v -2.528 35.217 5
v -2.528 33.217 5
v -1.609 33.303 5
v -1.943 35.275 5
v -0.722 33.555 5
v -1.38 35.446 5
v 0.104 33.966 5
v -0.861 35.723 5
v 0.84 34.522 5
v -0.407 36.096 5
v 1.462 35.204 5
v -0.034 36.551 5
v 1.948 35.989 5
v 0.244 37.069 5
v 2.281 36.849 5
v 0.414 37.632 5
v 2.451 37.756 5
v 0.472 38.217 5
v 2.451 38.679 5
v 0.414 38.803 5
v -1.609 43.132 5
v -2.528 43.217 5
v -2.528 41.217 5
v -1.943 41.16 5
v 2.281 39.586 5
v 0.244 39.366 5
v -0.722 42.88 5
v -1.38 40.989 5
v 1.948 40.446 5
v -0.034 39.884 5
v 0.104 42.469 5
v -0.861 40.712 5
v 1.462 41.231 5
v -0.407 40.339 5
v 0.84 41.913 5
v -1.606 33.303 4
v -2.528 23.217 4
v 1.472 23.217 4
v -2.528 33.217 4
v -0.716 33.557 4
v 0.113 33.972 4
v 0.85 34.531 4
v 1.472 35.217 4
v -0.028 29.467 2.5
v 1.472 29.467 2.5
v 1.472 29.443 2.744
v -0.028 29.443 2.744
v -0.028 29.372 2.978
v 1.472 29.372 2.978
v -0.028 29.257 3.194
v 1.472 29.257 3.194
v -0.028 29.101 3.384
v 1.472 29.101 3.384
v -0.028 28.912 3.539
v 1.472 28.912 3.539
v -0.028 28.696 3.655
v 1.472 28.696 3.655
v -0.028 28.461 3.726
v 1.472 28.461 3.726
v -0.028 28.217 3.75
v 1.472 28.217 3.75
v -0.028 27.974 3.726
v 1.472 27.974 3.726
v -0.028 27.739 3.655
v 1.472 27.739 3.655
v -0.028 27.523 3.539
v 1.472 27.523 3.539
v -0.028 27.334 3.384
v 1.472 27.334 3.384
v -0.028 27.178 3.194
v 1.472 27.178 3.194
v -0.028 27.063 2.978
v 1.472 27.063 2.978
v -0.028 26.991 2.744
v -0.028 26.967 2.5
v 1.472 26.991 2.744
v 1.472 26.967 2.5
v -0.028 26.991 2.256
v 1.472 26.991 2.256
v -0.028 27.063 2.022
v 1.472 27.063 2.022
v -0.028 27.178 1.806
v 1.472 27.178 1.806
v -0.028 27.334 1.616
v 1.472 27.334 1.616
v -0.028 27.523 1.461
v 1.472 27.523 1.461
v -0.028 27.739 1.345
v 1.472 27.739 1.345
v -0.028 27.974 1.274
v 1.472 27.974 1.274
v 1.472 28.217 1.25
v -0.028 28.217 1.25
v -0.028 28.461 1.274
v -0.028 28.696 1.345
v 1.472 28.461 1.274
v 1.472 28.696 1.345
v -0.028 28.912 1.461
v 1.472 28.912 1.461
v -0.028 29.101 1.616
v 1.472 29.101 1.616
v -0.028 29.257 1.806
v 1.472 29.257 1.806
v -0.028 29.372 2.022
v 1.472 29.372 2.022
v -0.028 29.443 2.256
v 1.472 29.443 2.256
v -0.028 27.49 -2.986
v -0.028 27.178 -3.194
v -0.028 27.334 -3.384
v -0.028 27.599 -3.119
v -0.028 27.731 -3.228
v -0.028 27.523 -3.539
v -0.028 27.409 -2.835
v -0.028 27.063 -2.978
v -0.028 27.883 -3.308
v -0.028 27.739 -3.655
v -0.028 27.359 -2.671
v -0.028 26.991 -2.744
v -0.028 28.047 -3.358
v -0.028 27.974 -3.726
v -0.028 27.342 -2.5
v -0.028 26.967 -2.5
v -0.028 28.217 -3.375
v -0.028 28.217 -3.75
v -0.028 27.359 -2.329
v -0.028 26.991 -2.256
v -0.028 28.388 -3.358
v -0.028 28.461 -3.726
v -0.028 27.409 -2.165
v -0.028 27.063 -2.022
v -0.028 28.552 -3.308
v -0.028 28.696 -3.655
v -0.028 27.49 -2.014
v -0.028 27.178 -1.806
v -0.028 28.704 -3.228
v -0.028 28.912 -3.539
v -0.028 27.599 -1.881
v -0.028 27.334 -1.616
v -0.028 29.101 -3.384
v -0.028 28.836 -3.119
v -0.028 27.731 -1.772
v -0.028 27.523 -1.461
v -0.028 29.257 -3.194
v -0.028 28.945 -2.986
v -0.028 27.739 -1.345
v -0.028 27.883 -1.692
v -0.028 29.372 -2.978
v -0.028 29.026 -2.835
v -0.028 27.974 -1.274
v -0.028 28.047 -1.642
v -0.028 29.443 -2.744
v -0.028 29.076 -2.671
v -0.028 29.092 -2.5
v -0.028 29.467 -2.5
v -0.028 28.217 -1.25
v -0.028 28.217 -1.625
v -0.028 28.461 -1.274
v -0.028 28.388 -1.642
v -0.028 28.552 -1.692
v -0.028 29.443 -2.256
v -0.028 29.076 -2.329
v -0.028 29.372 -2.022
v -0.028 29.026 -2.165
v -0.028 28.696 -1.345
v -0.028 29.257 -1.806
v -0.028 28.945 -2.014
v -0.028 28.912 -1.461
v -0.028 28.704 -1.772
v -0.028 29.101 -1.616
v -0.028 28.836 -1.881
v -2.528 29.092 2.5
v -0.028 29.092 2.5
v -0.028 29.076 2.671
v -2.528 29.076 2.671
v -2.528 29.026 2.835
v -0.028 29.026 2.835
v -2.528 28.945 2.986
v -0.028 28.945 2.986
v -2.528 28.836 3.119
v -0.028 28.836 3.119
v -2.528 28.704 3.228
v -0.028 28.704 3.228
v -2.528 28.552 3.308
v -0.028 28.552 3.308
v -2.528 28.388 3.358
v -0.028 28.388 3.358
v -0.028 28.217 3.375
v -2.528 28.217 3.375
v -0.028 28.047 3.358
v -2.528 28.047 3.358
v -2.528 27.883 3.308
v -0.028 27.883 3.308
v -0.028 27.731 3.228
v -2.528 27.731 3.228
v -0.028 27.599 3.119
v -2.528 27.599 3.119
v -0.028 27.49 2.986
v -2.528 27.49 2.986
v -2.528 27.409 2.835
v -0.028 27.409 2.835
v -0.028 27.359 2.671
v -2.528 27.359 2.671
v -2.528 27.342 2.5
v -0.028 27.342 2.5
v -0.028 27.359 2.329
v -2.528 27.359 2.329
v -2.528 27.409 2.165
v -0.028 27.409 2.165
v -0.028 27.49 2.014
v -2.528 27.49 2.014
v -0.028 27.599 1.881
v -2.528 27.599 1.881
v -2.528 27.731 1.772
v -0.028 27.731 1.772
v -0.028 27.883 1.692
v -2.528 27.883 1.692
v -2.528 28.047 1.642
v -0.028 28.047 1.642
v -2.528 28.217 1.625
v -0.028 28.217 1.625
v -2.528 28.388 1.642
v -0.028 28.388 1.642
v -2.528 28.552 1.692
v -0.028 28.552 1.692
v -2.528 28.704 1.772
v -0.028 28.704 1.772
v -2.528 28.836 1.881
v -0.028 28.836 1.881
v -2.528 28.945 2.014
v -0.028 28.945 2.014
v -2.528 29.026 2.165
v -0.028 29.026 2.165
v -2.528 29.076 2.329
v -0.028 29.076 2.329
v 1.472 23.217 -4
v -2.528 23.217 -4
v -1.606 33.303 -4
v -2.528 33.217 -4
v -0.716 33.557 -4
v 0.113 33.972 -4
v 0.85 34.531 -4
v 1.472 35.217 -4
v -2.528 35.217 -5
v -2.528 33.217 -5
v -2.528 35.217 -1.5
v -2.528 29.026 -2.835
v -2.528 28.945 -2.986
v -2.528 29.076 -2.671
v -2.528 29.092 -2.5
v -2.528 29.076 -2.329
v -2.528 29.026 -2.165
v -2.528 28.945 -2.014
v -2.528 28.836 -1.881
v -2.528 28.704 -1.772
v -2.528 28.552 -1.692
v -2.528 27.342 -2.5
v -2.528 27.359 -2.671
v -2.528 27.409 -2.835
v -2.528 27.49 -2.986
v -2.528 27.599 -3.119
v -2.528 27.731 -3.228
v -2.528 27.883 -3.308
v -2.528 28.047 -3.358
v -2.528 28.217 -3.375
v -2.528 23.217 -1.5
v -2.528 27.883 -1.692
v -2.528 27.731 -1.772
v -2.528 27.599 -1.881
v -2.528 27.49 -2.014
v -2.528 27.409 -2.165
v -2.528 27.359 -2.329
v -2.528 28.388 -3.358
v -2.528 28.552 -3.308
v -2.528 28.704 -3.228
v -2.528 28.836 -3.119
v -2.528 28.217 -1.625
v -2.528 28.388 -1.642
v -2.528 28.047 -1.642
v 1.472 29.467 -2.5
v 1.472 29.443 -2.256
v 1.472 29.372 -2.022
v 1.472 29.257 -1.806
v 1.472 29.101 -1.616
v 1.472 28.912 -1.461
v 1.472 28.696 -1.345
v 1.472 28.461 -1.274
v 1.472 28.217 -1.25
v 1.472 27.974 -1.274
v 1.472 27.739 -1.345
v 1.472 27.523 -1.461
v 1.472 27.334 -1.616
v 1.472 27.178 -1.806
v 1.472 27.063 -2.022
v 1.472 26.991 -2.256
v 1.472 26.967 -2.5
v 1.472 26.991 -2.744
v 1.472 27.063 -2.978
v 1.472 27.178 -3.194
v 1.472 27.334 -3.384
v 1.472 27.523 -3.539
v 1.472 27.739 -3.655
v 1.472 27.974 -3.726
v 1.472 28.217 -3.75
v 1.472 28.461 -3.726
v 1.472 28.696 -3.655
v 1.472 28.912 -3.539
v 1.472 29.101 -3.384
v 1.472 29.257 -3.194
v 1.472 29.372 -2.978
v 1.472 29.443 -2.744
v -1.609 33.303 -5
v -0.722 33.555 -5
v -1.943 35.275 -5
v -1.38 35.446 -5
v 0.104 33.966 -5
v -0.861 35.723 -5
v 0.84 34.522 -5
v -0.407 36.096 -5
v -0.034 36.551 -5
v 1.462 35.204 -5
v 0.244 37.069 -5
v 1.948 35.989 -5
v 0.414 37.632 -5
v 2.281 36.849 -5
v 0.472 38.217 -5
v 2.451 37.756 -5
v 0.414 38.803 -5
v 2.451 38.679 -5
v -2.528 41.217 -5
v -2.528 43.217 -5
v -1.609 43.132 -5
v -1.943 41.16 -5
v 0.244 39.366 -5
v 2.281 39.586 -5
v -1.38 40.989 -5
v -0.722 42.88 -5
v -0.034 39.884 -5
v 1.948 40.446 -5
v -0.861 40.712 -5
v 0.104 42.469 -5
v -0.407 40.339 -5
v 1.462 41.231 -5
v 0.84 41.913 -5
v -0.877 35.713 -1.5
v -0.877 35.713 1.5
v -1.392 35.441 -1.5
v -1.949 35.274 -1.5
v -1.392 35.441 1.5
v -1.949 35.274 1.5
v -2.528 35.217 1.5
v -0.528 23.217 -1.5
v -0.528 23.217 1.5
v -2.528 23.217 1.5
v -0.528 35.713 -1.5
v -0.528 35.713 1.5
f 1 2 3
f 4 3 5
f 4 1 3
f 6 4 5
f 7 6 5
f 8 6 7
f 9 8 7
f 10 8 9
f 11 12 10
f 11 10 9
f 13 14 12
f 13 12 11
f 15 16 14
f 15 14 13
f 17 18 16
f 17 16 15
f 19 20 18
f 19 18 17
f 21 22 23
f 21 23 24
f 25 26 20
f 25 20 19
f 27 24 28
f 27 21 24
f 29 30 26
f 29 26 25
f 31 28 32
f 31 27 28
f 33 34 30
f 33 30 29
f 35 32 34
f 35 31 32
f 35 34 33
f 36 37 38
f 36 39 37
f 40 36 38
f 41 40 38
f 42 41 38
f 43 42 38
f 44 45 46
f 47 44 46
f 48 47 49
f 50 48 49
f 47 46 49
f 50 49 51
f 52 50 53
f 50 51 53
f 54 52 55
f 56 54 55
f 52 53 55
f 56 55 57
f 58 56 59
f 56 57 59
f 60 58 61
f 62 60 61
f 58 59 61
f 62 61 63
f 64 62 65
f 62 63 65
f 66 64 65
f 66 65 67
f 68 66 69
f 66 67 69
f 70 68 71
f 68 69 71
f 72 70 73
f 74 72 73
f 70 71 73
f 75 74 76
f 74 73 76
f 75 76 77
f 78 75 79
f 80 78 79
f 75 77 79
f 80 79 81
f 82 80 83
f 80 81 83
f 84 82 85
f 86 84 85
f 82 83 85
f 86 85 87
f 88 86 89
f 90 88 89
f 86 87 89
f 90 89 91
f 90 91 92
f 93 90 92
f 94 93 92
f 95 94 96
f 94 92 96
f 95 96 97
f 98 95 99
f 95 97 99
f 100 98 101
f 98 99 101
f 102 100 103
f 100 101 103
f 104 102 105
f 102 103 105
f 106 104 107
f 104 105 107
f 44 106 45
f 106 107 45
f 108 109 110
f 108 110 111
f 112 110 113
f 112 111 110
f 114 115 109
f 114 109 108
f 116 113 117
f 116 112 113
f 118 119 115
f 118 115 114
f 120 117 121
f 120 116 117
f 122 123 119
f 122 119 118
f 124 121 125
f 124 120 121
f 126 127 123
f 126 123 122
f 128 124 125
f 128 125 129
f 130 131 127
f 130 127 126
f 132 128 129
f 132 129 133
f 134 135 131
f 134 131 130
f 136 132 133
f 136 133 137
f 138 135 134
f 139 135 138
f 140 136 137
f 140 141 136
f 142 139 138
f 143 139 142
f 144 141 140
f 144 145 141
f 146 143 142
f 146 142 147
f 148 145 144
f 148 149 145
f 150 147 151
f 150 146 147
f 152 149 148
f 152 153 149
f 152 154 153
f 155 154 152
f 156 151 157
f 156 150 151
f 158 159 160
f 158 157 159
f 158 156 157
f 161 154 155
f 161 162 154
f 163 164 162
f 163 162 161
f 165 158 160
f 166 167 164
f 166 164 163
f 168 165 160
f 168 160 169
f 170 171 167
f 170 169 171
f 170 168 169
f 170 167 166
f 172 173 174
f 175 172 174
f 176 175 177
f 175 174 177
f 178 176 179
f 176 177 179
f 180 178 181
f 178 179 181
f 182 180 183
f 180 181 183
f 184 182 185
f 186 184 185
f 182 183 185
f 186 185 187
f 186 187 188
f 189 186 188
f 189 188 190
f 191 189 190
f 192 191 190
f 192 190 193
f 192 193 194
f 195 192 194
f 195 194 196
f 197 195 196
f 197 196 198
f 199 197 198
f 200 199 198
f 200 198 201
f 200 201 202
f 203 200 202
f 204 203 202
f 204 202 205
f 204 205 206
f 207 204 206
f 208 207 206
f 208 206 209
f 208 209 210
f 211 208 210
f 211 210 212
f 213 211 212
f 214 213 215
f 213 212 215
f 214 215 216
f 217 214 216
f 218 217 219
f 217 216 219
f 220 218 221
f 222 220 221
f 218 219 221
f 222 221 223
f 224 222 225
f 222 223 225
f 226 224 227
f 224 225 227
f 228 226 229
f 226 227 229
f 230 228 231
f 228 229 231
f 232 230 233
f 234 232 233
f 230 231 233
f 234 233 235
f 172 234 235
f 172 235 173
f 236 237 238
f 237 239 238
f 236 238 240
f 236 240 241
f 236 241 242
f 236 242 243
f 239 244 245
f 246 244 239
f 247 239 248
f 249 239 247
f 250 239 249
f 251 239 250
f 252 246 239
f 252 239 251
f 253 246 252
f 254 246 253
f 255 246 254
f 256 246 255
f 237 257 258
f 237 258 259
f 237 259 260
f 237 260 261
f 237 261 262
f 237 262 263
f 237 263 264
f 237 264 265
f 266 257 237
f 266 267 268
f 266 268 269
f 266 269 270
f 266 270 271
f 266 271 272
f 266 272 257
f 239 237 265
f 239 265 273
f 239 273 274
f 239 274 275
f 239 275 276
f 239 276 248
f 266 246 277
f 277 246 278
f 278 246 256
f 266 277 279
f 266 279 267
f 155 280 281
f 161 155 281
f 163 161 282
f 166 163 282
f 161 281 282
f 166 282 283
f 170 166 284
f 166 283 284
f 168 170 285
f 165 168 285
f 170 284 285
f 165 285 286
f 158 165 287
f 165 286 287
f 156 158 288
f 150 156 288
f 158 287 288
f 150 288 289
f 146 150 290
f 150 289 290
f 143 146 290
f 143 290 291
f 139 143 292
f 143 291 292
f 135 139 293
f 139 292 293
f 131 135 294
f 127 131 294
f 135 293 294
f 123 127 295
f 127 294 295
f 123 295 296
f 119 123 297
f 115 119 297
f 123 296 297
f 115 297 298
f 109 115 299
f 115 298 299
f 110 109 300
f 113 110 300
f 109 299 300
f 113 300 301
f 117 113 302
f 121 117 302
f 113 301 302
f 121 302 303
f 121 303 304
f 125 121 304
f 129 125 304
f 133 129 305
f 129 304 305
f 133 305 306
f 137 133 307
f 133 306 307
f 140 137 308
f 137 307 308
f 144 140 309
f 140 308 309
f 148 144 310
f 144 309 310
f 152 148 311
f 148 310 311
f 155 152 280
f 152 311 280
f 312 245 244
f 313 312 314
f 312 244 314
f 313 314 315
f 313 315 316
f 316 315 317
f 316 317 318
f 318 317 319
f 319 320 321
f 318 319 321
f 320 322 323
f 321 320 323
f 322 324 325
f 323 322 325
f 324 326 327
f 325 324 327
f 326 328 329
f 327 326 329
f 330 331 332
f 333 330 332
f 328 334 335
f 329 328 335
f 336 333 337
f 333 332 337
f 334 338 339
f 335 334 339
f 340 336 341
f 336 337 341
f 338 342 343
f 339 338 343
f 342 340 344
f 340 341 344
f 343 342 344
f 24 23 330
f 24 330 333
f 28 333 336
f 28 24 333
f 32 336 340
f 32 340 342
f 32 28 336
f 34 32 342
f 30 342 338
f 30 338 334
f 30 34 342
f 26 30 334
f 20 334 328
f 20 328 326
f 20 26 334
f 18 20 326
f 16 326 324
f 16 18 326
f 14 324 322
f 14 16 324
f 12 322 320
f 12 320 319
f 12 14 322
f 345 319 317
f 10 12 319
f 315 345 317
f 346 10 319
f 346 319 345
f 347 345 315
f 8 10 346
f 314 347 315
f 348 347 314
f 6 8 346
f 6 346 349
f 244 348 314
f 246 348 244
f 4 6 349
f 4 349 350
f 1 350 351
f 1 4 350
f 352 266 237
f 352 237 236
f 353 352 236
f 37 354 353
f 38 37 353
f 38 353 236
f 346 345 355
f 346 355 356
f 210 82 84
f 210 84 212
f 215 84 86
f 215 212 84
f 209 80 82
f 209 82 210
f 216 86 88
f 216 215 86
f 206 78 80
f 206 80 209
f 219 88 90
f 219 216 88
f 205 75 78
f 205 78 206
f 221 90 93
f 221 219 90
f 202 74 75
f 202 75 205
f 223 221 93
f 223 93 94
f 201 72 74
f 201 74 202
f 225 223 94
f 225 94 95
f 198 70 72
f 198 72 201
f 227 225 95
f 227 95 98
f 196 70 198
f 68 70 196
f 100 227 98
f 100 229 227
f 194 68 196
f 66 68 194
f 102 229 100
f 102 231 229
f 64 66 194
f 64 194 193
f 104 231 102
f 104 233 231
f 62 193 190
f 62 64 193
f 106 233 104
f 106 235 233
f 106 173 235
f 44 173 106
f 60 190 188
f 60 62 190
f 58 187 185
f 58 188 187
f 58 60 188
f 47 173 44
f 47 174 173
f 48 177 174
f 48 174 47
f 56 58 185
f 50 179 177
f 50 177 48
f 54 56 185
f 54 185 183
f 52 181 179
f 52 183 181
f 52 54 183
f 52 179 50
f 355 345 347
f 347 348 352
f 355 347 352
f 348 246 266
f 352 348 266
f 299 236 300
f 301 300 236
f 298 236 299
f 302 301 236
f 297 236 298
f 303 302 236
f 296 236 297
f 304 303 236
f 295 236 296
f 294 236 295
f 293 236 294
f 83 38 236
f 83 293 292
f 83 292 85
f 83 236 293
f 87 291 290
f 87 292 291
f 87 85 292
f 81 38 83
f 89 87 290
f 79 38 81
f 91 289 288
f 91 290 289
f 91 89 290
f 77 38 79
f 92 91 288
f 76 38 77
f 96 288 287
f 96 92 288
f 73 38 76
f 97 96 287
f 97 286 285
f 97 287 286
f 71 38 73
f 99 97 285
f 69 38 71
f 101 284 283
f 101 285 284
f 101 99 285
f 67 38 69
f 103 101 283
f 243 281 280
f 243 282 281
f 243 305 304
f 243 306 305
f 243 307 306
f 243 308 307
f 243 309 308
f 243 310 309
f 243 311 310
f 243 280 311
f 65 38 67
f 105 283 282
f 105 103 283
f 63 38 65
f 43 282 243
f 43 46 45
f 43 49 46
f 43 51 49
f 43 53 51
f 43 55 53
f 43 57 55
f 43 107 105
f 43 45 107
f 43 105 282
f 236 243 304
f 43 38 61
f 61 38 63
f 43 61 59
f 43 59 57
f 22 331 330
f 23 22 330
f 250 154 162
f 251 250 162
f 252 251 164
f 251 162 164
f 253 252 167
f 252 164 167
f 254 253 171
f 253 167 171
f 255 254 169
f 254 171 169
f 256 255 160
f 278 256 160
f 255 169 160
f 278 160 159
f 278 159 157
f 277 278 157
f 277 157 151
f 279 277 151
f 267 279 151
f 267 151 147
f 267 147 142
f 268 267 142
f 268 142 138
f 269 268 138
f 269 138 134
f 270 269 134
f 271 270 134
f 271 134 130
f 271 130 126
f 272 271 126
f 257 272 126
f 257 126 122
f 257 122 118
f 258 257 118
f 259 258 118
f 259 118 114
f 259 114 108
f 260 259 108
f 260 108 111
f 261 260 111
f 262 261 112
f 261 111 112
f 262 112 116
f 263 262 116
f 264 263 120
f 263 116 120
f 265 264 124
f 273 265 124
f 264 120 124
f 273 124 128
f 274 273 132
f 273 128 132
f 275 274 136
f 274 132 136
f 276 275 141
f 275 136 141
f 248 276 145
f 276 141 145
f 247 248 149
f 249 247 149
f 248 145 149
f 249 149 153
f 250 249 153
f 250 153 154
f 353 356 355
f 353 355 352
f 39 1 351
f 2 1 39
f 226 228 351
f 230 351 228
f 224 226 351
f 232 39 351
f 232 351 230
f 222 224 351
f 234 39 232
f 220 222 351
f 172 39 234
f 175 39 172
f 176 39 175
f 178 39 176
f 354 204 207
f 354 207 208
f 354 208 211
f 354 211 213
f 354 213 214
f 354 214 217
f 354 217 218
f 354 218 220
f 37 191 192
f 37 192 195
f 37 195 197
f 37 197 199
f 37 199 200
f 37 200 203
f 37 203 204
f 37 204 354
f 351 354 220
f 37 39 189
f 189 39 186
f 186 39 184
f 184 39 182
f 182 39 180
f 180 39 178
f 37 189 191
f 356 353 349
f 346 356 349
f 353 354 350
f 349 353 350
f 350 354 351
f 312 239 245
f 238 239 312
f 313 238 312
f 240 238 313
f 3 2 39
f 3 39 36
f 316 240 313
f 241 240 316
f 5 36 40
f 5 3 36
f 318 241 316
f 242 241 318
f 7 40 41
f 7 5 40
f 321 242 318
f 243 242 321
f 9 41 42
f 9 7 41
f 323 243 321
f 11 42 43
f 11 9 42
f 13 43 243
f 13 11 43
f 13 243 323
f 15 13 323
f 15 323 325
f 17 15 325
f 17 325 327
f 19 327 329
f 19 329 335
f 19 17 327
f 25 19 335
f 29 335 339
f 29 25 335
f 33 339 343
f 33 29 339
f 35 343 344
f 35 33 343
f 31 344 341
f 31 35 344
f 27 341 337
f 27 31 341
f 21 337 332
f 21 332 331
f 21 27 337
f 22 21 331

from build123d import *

# Parameters (mm, degrees)
F1_DEPTH = 4
F2_DEPTH = 5
F3_W     = 12
F3_H     = 3
F3_W_2   = 0.4951214439
F4_DEPTH = 2
F5_R     = 1.25
F5_R_2   = 0.875
F6_DEPTH = 1.5
F7_DEPTH = 25


with BuildPart() as f1:
    # F0 (on Top) → F1 (new body, symmetric)
    with BuildSketch(Plane.XY):
        with BuildLine():
            Line((-2.528, 23.2174559587), (1.472, 23.2174559587))
            Line((1.472, 23.2174559587), (1.472, 35.2174559587))
            ThreePointArc((1.472, 35.2174559587), (-0.2919320225, 33.7453200037), (-2.528, 33.2174559587))
            Line((-2.528, 33.2174559587), (-2.528, 23.2174559587))
        make_face()
    extrude(amount=F1_DEPTH, both=True)

    # F0 (on Top) → F2 (join, symmetric)
    with BuildSketch(Plane.XY):
        with BuildLine():
            ThreePointArc((-2.528, 33.2174559587), (-0.2919320225, 33.7453200037), (1.472, 35.2174559587))
            ThreePointArc((1.472, 35.2174559587), (1.944135955, 40.4535239362), (-2.528, 43.2174559587))
            Line((-2.528, 43.2174559587), (-2.528, 41.2174559587))
            ThreePointArc((-2.528, 41.2174559587), (0.472, 38.2174559587), (-2.528, 35.2174559587))
            Line((-2.528, 35.2174559587), (-2.528, 33.2174559587))
        make_face()
    extrude(amount=F2_DEPTH, both=True)

    # F3 (on face) → F4 (cut)
    with BuildSketch(Plane(origin=(-2.528, 0, 0), x_dir=(0, -1, 0), z_dir=(-1, 0, 0))):
        with Locations((-29.2174559587, 0)):
            Rectangle(F3_W, F3_H)
        with Locations((-35.4650166806, 0)):
            Rectangle(F3_W_2, F3_H)
    extrude(amount=-F4_DEPTH, mode=Mode.SUBTRACT)

    # F5 (on face) → F6 (cut)
    with BuildSketch(Plane.YZ.offset(1.472)):
        with Locations((28.2174559587, 2.5)):
            Circle(F5_R)
        with Locations((28.2174559587, 2.5)):
            Circle(F5_R_2, mode=Mode.SUBTRACT)
        with Locations((28.2174559587, -2.5)):
            Circle(F5_R)
        with Locations((28.2174559587, -2.5)):
            Circle(F5_R_2, mode=Mode.SUBTRACT)
    extrude(amount=-F6_DEPTH, mode=Mode.SUBTRACT)

    # F7 (cut): faces of the model
    f7_faces = [f1.faces().sort_by_distance(p)[0] for p in [
        (1.472, 28.2174559587, 2.5),
        (1.472, 28.2174559587, -2.5),
    ]]
    extrude(f7_faces, amount=-F7_DEPTH, mode=Mode.SUBTRACT)


solid = f1.part
